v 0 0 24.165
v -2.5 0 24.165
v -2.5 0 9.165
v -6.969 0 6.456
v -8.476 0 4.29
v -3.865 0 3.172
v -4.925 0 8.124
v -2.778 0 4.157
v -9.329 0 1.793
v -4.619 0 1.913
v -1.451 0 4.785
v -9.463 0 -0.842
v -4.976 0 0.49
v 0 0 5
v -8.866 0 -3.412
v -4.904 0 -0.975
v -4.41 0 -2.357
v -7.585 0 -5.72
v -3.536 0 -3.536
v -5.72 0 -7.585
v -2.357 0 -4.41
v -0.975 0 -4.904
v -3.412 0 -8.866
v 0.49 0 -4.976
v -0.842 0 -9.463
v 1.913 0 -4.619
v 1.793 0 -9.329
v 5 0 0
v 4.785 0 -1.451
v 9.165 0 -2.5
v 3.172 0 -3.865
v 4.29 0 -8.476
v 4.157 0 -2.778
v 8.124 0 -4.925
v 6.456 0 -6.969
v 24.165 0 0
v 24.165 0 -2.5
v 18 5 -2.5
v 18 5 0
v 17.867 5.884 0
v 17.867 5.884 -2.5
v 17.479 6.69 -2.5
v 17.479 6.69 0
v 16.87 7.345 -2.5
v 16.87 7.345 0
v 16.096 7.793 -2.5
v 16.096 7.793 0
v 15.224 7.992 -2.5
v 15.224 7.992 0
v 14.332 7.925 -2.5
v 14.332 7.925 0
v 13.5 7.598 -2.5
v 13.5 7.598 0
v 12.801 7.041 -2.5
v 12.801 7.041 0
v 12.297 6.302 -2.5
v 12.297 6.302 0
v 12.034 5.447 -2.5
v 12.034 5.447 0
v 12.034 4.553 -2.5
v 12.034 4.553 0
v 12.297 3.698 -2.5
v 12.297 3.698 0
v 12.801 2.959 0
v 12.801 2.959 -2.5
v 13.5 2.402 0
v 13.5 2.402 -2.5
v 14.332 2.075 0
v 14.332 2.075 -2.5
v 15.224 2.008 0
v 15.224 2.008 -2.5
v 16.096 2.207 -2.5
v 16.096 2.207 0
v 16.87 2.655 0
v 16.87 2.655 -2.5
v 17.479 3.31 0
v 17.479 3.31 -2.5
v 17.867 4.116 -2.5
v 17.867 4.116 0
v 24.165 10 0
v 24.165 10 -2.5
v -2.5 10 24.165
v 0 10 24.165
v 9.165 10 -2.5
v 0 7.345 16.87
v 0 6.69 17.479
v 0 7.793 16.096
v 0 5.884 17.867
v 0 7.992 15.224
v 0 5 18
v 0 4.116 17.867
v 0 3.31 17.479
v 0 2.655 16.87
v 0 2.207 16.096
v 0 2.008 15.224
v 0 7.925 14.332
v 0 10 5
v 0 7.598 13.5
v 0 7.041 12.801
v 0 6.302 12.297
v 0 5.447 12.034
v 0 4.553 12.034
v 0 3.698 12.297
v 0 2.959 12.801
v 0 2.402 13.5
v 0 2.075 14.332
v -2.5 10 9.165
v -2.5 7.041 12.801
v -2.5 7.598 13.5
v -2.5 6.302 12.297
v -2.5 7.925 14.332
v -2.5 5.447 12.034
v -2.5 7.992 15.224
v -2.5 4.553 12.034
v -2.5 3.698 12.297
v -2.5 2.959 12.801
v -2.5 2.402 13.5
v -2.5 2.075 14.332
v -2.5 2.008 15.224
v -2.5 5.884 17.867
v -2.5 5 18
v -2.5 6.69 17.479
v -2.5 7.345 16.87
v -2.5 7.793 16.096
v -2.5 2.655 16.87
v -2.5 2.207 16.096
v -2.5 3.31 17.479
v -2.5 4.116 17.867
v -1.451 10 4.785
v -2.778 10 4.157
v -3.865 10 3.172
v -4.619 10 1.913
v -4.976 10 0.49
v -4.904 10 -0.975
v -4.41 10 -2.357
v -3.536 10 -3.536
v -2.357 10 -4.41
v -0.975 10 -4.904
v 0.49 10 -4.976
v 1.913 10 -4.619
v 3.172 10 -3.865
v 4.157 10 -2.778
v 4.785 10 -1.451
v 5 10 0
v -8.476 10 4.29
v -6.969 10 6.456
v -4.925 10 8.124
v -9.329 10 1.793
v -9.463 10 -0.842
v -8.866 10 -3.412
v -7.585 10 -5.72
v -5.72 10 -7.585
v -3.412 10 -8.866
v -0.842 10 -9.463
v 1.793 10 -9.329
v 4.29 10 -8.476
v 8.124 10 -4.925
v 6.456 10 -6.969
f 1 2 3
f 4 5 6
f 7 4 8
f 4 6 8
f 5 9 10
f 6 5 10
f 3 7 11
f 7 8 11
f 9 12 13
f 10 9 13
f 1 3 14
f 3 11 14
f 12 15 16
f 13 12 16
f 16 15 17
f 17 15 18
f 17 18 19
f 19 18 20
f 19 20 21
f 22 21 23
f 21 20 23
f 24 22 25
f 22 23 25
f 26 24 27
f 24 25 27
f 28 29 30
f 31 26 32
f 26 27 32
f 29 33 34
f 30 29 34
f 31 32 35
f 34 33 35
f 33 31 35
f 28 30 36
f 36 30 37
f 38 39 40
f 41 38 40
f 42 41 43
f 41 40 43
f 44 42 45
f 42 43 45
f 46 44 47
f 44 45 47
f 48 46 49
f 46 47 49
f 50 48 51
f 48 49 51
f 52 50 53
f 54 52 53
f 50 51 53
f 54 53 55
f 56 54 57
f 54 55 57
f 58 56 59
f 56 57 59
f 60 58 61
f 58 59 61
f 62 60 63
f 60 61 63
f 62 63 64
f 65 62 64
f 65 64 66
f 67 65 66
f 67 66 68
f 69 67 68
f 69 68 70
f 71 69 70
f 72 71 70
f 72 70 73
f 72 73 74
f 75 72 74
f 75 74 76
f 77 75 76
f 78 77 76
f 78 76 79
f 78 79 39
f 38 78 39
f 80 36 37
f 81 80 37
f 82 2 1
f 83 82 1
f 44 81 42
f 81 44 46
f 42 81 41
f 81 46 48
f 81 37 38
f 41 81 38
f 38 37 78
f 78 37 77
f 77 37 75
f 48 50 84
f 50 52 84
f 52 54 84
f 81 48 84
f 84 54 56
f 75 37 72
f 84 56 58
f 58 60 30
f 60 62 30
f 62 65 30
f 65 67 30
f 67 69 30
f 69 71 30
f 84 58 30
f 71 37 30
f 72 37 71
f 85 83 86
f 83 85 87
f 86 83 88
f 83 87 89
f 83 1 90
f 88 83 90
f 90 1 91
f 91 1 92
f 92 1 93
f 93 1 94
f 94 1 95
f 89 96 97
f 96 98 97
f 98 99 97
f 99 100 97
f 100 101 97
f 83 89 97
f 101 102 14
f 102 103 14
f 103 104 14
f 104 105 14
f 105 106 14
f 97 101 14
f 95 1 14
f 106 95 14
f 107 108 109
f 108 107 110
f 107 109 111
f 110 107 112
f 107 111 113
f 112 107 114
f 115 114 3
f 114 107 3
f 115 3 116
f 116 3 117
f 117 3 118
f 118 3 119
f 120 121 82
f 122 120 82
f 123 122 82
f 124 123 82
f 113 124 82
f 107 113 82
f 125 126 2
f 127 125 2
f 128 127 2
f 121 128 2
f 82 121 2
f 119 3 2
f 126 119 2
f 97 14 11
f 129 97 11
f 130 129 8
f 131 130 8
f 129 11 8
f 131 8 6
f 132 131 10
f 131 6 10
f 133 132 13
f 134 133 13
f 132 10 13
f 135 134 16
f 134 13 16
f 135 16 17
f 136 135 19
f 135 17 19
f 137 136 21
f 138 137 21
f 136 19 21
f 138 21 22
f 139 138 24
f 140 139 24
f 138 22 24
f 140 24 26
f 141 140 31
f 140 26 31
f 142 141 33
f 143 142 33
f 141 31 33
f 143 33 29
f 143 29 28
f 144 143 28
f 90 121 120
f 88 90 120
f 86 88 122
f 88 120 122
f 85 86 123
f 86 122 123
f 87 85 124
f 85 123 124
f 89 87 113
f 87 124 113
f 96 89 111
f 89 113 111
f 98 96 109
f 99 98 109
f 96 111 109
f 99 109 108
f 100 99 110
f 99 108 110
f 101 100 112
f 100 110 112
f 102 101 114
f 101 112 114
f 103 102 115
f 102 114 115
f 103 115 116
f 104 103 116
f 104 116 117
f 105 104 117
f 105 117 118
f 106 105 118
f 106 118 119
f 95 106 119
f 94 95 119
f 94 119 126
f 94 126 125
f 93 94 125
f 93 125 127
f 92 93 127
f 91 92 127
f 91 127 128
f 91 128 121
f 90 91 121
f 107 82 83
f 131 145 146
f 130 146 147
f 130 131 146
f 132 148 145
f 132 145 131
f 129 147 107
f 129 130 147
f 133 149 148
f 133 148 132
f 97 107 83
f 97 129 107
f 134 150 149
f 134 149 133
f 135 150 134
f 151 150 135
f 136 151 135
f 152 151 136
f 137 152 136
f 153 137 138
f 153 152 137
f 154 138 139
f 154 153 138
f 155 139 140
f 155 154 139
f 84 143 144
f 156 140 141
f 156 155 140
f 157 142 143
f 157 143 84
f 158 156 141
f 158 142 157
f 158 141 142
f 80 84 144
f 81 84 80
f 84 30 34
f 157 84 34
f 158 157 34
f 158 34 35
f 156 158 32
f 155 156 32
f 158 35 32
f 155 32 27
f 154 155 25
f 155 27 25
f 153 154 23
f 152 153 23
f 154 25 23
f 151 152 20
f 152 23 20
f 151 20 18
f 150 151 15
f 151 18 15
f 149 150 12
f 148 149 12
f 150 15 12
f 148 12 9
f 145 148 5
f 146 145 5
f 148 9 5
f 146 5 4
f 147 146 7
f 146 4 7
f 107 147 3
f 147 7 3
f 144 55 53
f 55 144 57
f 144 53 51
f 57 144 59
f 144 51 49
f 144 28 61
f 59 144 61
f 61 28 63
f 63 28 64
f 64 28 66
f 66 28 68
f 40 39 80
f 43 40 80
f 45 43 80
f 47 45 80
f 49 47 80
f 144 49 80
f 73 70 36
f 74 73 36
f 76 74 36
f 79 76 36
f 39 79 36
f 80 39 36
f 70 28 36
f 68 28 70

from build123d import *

# Parameters (mm, degrees)
BOSS_EXTRUDE1_DEPTH = 10
SKETCH2_R           = 3
CUT_EXTRUDE1_DEPTH  = 38.349495851
CIRPATTERN1_COUNT   = 2
CIRPATTERN1_ANGLE   = 90


with BuildPart() as part:
    # Sketch1 → Boss-Extrude1 (new body)
    with BuildSketch(Plane(origin=(0, 0, 0), x_dir=(1, 0, 0), z_dir=(0, 1, 0))):
        with BuildLine():
            Line((0, -24.16515139), (0, -5))
            ThreePointArc((0, -5), (-3.535533906, 3.535533906), (5, 0))
            Line((5, 0), (24.16515139, 0))
            Line((24.16515139, 0), (24.16515139, 2.5))
            Line((24.16515139, 2.5), (9.16515139, 2.5))
            ThreePointArc((9.16515139, 2.5), (-6.717514421, 6.717514421), (-2.5, -9.16515139))
            Line((-2.5, -9.16515139), (-2.5, -24.16515139))
            Line((-2.5, -24.16515139), (0, -24.16515139))
        make_face()
    extrude(amount=BOSS_EXTRUDE1_DEPTH)

    # Sketch2 → Cut-Extrude1 (cut, through all)
    with BuildSketch(Plane.ZY.offset(2.5)):
        with Locations((15, 5)):
            Circle(SKETCH2_R)
    cut_extrude1 = extrude(amount=-CUT_EXTRUDE1_DEPTH, mode=Mode.SUBTRACT)

    # CirPattern1: Cut-Extrude1 ×2 about axis
    cirpattern1_axis = Axis((0, 10, 0), (0, 1, 0))
    for i in range(1, CIRPATTERN1_COUNT):
        add(cut_extrude1.rotate(cirpattern1_axis, i * CIRPATTERN1_ANGLE / (CIRPATTERN1_COUNT - 1)), mode=Mode.SUBTRACT)


solid = part.part
